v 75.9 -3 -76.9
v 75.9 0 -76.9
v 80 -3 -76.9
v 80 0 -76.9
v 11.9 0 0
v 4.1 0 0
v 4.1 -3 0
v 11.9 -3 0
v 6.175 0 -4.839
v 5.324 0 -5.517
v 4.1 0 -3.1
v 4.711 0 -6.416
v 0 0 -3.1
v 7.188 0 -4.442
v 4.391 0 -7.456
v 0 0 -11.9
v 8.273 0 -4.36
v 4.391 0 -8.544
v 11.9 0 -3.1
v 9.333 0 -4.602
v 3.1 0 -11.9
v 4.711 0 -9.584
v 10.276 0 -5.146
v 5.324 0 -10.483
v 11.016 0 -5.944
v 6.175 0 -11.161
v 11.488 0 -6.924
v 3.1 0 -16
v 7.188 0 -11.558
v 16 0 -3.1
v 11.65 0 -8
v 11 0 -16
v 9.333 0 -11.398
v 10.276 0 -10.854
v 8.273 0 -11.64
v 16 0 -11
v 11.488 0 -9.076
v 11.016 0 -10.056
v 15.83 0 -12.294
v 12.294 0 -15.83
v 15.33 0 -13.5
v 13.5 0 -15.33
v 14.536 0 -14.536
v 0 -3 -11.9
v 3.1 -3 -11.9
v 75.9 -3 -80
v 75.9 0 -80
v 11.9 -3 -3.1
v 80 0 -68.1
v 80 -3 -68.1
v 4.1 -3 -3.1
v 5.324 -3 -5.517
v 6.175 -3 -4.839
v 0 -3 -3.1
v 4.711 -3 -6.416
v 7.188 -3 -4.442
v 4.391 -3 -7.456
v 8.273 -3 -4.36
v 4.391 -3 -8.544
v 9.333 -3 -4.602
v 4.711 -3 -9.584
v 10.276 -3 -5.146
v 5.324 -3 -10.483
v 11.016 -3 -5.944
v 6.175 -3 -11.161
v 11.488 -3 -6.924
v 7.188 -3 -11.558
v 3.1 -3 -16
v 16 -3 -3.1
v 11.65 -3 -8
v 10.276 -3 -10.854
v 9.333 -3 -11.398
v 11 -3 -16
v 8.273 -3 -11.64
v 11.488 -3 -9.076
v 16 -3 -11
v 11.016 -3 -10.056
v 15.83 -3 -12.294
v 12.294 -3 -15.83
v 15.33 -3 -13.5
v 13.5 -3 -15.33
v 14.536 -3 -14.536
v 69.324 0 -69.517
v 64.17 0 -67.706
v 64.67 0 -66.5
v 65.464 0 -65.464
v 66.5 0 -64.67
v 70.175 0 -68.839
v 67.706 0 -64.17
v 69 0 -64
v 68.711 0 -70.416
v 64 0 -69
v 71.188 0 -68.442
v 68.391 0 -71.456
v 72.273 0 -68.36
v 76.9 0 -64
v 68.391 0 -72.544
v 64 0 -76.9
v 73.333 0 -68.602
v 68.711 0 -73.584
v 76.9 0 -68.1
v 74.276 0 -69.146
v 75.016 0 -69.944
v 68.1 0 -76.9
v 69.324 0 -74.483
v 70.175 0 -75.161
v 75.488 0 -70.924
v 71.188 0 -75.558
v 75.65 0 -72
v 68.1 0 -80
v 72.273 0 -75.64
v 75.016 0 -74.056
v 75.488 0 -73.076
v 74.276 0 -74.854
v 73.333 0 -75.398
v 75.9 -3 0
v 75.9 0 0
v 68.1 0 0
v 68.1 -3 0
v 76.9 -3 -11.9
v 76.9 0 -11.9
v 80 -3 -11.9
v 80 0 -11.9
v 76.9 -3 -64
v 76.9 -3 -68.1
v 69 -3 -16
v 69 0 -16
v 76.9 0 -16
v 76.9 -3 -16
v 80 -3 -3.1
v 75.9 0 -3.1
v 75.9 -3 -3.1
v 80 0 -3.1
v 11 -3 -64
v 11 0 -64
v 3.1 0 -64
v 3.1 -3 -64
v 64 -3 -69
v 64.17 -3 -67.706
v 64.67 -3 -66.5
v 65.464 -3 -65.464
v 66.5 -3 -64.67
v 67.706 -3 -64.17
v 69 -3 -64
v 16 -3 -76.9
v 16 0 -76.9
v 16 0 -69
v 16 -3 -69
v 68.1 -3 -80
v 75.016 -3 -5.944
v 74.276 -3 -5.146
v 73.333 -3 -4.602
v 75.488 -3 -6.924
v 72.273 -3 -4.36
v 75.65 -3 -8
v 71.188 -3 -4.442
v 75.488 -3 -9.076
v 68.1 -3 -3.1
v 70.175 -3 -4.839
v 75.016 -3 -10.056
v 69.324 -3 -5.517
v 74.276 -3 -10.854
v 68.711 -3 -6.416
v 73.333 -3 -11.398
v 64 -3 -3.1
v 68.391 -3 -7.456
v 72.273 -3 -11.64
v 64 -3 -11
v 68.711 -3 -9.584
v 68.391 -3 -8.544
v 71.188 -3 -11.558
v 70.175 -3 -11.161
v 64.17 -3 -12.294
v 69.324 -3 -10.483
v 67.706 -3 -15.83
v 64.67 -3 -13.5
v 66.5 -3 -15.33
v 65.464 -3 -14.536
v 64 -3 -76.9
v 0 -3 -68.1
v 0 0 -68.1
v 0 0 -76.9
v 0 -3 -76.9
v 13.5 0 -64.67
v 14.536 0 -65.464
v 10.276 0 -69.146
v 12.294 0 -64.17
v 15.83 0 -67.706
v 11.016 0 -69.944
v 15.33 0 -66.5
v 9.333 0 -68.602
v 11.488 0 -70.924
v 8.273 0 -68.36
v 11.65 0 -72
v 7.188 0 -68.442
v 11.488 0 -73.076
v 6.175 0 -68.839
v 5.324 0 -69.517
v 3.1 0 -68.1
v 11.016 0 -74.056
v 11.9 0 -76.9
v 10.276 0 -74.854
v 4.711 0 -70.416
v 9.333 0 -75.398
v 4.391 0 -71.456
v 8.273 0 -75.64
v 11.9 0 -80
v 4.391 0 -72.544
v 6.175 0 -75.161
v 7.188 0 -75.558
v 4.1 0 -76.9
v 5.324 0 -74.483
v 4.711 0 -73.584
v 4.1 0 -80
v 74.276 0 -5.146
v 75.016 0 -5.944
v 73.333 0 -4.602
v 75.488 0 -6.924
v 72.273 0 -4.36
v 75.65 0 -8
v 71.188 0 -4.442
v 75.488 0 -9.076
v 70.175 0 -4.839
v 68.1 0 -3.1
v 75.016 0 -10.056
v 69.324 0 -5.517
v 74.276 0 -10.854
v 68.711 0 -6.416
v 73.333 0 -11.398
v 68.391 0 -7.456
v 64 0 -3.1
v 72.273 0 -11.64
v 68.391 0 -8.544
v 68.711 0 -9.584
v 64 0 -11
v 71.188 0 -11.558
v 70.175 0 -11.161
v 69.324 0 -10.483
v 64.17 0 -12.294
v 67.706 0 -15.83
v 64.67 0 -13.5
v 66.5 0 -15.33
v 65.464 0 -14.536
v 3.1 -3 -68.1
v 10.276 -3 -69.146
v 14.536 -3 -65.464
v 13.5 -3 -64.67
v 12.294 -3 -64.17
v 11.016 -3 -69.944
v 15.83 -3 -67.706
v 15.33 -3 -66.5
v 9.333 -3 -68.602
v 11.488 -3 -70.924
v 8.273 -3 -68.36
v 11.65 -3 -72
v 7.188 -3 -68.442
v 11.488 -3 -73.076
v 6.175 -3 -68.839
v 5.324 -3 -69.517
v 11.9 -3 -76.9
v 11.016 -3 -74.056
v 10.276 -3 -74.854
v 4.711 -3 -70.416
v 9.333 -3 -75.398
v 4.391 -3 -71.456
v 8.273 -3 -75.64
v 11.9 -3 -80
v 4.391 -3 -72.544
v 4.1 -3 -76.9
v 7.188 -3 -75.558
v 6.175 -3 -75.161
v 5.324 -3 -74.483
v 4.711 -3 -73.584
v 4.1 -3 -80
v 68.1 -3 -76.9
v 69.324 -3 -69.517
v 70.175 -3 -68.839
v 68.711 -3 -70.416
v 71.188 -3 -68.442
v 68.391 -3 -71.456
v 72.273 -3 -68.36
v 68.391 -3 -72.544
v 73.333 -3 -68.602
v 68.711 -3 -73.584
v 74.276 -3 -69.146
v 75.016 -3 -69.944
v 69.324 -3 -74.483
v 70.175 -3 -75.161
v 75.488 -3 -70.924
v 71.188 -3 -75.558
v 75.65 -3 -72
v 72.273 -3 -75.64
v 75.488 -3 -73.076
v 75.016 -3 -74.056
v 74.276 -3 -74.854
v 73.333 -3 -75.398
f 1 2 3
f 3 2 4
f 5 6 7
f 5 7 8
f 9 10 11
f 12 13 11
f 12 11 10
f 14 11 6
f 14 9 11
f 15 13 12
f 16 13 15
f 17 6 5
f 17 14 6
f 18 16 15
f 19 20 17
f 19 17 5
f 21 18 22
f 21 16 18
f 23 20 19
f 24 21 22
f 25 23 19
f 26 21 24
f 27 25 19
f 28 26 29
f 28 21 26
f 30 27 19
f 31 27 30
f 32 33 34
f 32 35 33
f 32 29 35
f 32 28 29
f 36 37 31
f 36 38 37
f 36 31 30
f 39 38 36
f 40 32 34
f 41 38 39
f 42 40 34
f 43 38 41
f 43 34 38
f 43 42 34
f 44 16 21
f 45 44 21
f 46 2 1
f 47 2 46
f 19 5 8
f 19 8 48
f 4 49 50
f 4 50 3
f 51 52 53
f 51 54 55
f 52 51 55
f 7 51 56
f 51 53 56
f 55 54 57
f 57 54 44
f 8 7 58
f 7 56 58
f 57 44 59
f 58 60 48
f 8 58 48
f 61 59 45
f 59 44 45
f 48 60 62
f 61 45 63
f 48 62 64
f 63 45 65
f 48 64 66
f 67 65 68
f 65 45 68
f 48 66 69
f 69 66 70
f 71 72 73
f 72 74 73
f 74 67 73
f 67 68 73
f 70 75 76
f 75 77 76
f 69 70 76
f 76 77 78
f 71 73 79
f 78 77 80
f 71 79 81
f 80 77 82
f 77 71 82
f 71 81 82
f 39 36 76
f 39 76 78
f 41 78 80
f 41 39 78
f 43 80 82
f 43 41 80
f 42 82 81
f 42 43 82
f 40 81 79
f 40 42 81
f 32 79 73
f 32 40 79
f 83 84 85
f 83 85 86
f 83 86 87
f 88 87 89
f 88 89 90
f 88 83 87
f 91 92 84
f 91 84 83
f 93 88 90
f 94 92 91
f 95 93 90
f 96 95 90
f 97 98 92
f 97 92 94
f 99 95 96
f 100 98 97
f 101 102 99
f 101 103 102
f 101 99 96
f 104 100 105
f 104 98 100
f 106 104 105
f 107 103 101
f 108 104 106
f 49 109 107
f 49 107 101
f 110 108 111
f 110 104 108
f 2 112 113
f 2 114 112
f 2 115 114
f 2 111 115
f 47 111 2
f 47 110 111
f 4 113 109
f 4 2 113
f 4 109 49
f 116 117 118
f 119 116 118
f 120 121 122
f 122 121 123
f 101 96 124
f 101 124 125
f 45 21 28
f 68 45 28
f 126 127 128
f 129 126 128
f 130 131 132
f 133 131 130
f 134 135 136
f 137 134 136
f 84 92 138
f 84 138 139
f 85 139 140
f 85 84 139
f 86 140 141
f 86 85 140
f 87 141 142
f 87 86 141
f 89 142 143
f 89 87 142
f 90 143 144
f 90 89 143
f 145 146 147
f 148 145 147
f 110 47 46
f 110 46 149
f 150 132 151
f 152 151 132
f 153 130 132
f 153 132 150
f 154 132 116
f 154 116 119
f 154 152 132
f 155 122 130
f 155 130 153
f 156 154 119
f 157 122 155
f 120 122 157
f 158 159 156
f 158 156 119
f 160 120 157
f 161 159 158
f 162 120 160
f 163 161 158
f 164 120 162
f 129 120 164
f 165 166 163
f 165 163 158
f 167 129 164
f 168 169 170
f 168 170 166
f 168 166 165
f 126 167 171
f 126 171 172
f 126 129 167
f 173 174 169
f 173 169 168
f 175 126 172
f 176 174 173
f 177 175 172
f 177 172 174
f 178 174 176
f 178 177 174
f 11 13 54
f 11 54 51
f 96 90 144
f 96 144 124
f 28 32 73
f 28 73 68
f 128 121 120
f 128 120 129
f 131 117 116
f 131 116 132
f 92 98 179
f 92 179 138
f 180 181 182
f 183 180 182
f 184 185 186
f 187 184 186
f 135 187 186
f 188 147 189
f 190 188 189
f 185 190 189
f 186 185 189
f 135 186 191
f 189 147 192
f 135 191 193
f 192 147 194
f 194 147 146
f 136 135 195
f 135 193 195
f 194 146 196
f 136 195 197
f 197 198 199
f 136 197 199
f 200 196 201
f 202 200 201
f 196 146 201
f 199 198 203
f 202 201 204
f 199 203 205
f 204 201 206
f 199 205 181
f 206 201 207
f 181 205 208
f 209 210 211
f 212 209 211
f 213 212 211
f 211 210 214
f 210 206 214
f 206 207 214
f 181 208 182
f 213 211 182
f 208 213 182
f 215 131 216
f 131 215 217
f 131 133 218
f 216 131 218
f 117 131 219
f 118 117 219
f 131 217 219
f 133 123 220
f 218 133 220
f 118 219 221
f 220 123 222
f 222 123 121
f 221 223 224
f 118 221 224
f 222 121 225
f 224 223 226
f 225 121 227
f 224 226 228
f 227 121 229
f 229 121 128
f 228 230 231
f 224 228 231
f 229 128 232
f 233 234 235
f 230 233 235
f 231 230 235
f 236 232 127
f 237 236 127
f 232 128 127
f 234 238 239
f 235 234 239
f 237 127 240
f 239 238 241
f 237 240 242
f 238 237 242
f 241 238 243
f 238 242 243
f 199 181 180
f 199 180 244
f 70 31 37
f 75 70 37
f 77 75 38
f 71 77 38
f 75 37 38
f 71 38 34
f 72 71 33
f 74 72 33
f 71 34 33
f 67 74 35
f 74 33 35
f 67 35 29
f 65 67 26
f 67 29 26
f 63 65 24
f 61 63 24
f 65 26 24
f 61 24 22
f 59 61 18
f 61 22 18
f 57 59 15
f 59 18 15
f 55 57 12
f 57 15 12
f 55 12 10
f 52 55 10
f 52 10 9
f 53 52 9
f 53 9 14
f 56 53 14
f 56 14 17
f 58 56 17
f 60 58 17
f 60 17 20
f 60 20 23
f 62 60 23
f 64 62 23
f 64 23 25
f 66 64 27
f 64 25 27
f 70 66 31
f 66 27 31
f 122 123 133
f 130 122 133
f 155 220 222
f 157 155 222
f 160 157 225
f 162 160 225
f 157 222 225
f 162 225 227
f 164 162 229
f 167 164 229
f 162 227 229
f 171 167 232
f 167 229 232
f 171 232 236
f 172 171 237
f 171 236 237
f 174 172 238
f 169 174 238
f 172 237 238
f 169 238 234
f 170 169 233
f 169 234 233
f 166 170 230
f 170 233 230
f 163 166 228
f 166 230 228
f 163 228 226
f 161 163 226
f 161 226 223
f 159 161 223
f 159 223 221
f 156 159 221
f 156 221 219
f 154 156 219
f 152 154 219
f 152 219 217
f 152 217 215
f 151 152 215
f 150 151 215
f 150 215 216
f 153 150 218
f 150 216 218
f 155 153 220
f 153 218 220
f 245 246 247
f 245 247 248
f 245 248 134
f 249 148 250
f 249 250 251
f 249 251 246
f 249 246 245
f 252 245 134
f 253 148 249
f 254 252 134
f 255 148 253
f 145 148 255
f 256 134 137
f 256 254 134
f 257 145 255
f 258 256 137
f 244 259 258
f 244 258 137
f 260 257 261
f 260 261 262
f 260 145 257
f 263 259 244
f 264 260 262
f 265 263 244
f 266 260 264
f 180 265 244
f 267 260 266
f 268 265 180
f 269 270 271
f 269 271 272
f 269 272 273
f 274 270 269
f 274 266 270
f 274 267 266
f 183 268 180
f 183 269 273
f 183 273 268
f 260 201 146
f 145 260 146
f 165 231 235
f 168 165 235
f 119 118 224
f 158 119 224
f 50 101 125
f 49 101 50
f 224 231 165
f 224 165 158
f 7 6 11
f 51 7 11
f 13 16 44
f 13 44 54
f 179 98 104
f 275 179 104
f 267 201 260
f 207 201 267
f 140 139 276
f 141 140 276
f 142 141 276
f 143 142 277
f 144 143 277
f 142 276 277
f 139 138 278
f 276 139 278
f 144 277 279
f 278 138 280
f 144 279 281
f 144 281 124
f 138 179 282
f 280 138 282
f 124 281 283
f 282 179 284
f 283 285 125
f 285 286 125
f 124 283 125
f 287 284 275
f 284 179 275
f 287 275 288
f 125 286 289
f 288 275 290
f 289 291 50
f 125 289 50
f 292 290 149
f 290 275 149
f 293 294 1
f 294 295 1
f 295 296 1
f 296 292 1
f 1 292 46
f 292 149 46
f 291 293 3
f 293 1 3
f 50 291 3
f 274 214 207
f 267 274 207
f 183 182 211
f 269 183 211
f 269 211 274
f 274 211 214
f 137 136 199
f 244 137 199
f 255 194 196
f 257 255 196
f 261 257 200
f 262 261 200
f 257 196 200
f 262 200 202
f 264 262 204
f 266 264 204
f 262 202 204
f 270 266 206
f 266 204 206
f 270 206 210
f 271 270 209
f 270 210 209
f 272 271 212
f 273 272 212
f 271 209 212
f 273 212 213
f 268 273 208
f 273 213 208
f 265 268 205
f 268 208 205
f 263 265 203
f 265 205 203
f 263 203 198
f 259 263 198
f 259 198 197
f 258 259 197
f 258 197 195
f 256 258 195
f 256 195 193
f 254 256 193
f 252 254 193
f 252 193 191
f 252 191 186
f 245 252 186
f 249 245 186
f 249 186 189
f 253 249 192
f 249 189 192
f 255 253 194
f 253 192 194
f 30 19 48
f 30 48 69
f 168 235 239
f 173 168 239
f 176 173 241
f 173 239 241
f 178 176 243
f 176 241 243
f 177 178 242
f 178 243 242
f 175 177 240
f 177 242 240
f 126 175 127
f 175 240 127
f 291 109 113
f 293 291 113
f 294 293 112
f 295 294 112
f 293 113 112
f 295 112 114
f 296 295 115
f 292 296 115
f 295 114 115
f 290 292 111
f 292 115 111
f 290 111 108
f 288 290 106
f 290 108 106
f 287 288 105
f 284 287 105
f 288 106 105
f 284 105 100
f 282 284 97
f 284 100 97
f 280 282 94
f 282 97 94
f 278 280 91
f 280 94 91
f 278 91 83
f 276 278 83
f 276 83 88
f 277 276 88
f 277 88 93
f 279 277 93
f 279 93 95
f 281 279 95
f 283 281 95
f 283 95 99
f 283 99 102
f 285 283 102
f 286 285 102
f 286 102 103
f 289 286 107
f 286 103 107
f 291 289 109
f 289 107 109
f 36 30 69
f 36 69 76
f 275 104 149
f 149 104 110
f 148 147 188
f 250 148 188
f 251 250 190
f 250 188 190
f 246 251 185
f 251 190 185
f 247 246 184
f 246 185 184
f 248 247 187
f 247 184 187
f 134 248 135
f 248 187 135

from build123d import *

# Parameters (mm, degrees)
SKETCH1_R             = 3.65
BOSS_EXTRUDE1_DEPTH   = 3
BOSS_EXTRUDE1_2_DEPTH = 3
BOSS_EXTRUDE1_3_DEPTH = 3
BOSS_EXTRUDE1_4_DEPTH = 3
SKETCH3_W             = 4.2
SKETCH3_H             = 3.2
SKETCH3_W_2           = 3.2
SKETCH3_H_2           = 4.2
CUT_EXTRUDE1_DEPTH    = 4


with BuildPart() as part:
    # Sketch1 → Boss-Extrude1 (new body)
    with BuildSketch(Plane(origin=(0, 0, 0), x_dir=(1, 0, 0), z_dir=(0, 1, 0))):
        with BuildLine():
            Line((0, 0), (16, 0))
            Line((16, 0), (16, 11))
            ThreePointArc((16, 11), (14.535533906, 14.535533906), (11, 16))
            Line((11, 16), (0, 16))
            Line((0, 16), (0, 0))
        make_face()
        with Locations((8, 8)):
            Circle(SKETCH1_R, mode=Mode.SUBTRACT)
    extrude(amount=-BOSS_EXTRUDE1_DEPTH)


with BuildPart() as body_2:
    # Sketch1 → Boss-Extrude1 2 (new body)
    with BuildSketch(Plane(origin=(0, 0, 0), x_dir=(1, 0, 0), z_dir=(0, 1, 0))):
        with BuildLine():
            Line((16, 80), (16, 69))
            ThreePointArc((16, 69), (14.535533906, 65.464466094), (11, 64))
            Line((11, 64), (0, 64))
            Line((0, 64), (0, 80))
            Line((0, 80), (16, 80))
        make_face()
        with Locations((8, 72)):
            Circle(SKETCH1_R, mode=Mode.SUBTRACT)
    extrude(amount=-BOSS_EXTRUDE1_2_DEPTH)


with BuildPart() as body_3:
    # Sketch1 → Boss-Extrude1 3 (new body)
    with BuildSketch(Plane(origin=(0, 0, 0), x_dir=(1, 0, 0), z_dir=(0, 1, 0))):
        with BuildLine():
            Line((80, 80), (64, 80))
            Line((64, 80), (64, 69))
            ThreePointArc((64, 69), (65.464466094, 65.464466094), (69, 64))
            Line((69, 64), (80, 64))
            Line((80, 64), (80, 80))
        make_face()
        with Locations((72, 72)):
            Circle(SKETCH1_R, mode=Mode.SUBTRACT)
    extrude(amount=-BOSS_EXTRUDE1_3_DEPTH)


with BuildPart() as body_4:
    # Sketch1 → Boss-Extrude1 4 (new body)
    with BuildSketch(Plane(origin=(0, 0, 0), x_dir=(1, 0, 0), z_dir=(0, 1, 0))):
        with BuildLine():
            Line((64, 0), (64, 11))
            ThreePointArc((64, 11), (65.464466094, 14.535533906), (69, 16))
            Line((69, 16), (80, 16))
            Line((80, 16), (80, 0))
            Line((80, 0), (64, 0))
        make_face()
        with Locations((72, 8)):
            Circle(SKETCH1_R, mode=Mode.SUBTRACT)
    extrude(amount=-BOSS_EXTRUDE1_4_DEPTH)


with BuildPart() as cut_extrude1_tool:
    # Sketch3 → Cut-Extrude1 (new body, through all)
    with BuildSketch(Plane(origin=(0, 0, 0), x_dir=(1, 0, 0), z_dir=(0, 1, 0))):
        with Locations((14, 1.5)):
            Rectangle(SKETCH3_W, SKETCH3_H)
        with Locations((1.5, 66)):
            Rectangle(SKETCH3_W_2, SKETCH3_H_2)
        with Locations((78.5, 14)):
            Rectangle(SKETCH3_W_2, SKETCH3_H_2)
        with Locations((78, 1.5)):
            Rectangle(SKETCH3_W, SKETCH3_H)
        with Locations((2, 1.5)):
            Rectangle(SKETCH3_W, SKETCH3_H)
        with Locations((1.5, 14)):
            Rectangle(SKETCH3_W_2, SKETCH3_H_2)
        with Locations((66, 1.5)):
            Rectangle(SKETCH3_W, SKETCH3_H)
        with Locations((78, 78.5)):
            Rectangle(SKETCH3_W, SKETCH3_H)
        with Locations((66, 78.5)):
            Rectangle(SKETCH3_W, SKETCH3_H)
        with Locations((14, 78.5)):
            Rectangle(SKETCH3_W, SKETCH3_H)
        with Locations((2, 78.5)):
            Rectangle(SKETCH3_W, SKETCH3_H)
        with Locations((78.5, 66)):
            Rectangle(SKETCH3_W_2, SKETCH3_H_2)
    extrude(amount=-CUT_EXTRUDE1_DEPTH)


with BuildPart() as part_1:
    add(part.part)

    # Cut-Extrude1: cut by cut_extrude1_tool
    add(cut_extrude1_tool.part, mode=Mode.SUBTRACT)


with BuildPart() as body_2_1:
    add(body_2.part)

    # Cut-Extrude1: cut by cut_extrude1_tool
    add(cut_extrude1_tool.part, mode=Mode.SUBTRACT)


with BuildPart() as body_3_1:
    add(body_3.part)

    # Cut-Extrude1: cut by cut_extrude1_tool
    add(cut_extrude1_tool.part, mode=Mode.SUBTRACT)


with BuildPart() as body_4_1:
    add(body_4.part)

    # Cut-Extrude1: cut by cut_extrude1_tool
    add(cut_extrude1_tool.part, mode=Mode.SUBTRACT)


solid = Compound([part_1.part, body_2_1.part, body_3_1.part, body_4_1.part])
